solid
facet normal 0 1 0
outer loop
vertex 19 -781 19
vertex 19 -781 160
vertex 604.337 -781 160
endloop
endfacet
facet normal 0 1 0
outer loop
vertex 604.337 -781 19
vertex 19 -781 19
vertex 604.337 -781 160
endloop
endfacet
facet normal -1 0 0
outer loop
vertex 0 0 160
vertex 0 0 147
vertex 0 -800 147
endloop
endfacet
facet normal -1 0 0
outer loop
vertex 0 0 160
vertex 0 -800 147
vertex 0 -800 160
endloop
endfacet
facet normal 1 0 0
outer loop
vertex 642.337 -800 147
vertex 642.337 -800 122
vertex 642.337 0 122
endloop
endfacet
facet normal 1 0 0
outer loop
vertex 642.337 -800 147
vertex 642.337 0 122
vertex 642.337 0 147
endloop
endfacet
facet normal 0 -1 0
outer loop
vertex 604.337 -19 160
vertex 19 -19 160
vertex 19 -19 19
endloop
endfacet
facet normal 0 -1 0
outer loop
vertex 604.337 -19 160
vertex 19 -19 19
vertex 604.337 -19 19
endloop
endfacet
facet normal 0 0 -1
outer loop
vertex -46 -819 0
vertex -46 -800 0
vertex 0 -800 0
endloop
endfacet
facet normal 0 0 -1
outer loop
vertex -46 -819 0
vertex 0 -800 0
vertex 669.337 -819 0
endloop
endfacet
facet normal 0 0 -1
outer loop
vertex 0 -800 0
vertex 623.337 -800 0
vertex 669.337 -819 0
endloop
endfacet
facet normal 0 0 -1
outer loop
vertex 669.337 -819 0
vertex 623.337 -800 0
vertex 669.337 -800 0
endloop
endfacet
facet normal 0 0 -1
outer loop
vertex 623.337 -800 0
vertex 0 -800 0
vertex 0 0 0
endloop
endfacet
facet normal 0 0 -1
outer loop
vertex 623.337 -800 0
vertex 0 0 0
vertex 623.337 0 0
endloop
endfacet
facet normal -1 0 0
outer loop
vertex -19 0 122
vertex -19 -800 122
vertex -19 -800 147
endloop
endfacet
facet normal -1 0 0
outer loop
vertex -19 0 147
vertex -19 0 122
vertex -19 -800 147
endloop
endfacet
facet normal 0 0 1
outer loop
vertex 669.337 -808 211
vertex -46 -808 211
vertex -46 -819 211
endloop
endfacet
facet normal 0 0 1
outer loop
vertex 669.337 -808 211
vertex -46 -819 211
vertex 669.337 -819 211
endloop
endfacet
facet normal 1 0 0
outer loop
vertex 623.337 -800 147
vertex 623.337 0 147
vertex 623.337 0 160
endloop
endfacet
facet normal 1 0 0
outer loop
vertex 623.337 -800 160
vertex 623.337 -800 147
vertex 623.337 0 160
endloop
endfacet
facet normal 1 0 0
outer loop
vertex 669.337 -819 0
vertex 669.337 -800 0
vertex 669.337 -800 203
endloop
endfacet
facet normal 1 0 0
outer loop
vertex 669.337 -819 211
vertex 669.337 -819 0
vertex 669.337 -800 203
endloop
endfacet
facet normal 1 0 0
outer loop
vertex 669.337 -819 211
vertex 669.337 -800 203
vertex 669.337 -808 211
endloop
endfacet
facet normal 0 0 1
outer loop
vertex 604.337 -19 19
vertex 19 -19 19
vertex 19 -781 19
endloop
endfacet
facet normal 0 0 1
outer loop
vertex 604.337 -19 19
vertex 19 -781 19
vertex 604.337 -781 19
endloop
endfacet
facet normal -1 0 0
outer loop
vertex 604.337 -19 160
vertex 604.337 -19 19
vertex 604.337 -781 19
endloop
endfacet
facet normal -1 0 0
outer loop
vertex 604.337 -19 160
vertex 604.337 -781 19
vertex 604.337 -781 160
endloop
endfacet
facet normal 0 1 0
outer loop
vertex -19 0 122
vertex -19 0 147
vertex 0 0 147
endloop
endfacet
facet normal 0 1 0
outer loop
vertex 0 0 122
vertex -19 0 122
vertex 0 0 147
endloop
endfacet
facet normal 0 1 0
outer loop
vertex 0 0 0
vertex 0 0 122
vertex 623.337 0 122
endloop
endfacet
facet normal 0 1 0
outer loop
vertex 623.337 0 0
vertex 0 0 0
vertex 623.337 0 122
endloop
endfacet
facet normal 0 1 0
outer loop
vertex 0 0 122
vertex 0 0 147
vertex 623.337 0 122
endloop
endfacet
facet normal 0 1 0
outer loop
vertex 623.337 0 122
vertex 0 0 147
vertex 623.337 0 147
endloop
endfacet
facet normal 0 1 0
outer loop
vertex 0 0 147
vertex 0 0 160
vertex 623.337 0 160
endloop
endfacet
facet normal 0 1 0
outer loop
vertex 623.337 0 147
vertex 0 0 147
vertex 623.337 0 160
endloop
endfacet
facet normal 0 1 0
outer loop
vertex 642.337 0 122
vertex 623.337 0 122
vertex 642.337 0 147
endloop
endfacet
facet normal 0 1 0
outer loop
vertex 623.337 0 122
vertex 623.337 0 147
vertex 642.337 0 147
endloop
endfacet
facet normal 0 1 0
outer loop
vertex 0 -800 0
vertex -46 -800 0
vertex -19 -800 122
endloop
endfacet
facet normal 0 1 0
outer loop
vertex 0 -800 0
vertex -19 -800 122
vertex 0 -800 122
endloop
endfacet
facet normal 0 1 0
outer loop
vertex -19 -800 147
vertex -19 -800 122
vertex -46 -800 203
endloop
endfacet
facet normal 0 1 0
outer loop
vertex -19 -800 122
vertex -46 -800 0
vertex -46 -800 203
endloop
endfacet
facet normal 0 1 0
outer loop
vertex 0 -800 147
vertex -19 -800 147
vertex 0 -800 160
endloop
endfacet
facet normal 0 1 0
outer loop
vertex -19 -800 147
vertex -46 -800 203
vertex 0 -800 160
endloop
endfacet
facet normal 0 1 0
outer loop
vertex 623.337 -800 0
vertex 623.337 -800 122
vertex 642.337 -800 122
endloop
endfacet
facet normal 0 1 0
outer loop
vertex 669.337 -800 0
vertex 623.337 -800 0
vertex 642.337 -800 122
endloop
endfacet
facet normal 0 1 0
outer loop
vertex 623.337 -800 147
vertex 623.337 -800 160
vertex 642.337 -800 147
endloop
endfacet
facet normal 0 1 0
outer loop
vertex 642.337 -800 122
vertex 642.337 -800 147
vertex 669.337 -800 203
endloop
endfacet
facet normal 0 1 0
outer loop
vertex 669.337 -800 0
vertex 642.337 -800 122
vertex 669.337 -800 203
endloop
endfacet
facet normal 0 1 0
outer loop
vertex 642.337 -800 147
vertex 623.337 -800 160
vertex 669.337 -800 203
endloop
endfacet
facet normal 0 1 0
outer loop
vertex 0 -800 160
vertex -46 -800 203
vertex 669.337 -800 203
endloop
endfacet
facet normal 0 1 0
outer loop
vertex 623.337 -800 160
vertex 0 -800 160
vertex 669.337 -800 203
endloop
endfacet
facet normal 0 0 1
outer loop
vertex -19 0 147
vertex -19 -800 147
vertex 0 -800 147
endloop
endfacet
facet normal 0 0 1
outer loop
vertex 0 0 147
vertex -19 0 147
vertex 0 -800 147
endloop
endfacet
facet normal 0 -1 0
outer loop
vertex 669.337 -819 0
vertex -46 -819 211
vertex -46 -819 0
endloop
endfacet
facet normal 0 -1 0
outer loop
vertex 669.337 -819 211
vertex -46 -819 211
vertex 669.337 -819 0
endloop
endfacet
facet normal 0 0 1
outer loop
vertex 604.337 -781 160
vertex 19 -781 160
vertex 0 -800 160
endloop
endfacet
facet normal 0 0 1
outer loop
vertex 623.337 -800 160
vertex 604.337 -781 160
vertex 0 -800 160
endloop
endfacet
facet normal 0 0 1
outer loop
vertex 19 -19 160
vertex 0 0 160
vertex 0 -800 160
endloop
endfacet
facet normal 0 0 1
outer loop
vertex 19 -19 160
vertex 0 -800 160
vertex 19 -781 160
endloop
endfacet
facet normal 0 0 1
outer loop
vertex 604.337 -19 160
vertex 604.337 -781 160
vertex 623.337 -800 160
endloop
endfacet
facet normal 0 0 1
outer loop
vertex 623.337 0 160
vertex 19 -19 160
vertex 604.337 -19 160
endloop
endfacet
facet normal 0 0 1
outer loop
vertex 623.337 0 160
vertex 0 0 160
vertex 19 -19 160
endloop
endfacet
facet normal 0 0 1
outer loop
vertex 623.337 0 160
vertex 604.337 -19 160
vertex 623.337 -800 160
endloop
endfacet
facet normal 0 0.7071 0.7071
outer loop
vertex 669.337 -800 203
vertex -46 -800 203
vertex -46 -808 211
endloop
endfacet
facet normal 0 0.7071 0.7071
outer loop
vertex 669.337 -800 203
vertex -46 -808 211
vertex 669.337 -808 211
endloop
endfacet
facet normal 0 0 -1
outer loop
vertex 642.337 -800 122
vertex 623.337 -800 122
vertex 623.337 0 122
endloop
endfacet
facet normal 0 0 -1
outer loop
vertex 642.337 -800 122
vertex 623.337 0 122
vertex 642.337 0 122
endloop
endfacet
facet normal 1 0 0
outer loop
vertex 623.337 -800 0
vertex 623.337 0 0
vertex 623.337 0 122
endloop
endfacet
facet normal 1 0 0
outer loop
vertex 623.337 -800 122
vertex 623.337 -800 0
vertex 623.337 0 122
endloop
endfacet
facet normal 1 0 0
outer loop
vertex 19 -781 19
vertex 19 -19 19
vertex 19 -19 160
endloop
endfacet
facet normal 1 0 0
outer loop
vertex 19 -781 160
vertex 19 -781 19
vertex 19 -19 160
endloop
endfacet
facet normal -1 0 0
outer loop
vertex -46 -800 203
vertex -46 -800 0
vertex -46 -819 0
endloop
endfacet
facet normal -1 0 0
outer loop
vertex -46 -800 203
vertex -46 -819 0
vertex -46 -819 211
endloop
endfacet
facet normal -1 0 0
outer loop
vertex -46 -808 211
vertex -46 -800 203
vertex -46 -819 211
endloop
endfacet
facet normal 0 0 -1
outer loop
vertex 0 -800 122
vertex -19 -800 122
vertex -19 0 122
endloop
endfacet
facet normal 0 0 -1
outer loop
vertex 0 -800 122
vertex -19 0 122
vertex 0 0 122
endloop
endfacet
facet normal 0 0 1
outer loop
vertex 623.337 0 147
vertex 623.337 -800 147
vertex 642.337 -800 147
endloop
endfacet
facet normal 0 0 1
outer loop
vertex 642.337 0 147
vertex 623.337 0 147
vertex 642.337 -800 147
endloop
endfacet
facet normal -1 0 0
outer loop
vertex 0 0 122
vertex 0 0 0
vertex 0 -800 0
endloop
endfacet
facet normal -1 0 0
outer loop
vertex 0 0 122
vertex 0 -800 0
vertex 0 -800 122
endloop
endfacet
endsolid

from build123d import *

# Parameters (mm, degrees)
F0_W     = 623.337
F0_H     = 160
F1_DEPTH = 800
F2_T     = -19
F3_W     = 19
F3_H     = 25
F4_DEPTH = 800
F6_W     = 715.337
F6_H     = 211
F7_DEPTH = 19
F9_SIZE  = 8


with BuildPart() as f1:
    # F0 (on Front) → F1 (new body)
    with BuildSketch(Plane.XZ):
        with Locations((311.6685, 80)):
            Rectangle(F0_W, F0_H)
    extrude(amount=F1_DEPTH)

    # F2
    f2_openings = [f1.faces().sort_by_distance(p)[0] for p in [
        (311.6685, -400, 160),
    ]]
    offset(amount=F2_T, openings=f2_openings)


with BuildPart() as f4:
    # F3 (on face) → F4 (new body)
    with BuildSketch(Plane.XZ.offset(800)):
        with Locations((-9.5, 134.5)):
            Rectangle(F3_W, F3_H)
        with Locations((632.837, 134.5)):
            Rectangle(F3_W, F3_H)
    extrude(amount=-F4_DEPTH)


with BuildPart() as f1_1:
    add(f1.part)

    # F5: union F4
    add(f4.part)

    # F6 (on face) → F7 (join)
    with BuildSketch(Plane.XZ.offset(800)):
        with Locations((311.6685, 105.5)):
            Rectangle(F6_W, F6_H)
    extrude(amount=F7_DEPTH)

    # F9
    f9_edges = [f1_1.edges().sort_by_distance(p)[0] for p in [
        (311.6685, -800, 211),
    ]]
    chamfer(f9_edges, length=F9_SIZE)


solid = f1_1.part
